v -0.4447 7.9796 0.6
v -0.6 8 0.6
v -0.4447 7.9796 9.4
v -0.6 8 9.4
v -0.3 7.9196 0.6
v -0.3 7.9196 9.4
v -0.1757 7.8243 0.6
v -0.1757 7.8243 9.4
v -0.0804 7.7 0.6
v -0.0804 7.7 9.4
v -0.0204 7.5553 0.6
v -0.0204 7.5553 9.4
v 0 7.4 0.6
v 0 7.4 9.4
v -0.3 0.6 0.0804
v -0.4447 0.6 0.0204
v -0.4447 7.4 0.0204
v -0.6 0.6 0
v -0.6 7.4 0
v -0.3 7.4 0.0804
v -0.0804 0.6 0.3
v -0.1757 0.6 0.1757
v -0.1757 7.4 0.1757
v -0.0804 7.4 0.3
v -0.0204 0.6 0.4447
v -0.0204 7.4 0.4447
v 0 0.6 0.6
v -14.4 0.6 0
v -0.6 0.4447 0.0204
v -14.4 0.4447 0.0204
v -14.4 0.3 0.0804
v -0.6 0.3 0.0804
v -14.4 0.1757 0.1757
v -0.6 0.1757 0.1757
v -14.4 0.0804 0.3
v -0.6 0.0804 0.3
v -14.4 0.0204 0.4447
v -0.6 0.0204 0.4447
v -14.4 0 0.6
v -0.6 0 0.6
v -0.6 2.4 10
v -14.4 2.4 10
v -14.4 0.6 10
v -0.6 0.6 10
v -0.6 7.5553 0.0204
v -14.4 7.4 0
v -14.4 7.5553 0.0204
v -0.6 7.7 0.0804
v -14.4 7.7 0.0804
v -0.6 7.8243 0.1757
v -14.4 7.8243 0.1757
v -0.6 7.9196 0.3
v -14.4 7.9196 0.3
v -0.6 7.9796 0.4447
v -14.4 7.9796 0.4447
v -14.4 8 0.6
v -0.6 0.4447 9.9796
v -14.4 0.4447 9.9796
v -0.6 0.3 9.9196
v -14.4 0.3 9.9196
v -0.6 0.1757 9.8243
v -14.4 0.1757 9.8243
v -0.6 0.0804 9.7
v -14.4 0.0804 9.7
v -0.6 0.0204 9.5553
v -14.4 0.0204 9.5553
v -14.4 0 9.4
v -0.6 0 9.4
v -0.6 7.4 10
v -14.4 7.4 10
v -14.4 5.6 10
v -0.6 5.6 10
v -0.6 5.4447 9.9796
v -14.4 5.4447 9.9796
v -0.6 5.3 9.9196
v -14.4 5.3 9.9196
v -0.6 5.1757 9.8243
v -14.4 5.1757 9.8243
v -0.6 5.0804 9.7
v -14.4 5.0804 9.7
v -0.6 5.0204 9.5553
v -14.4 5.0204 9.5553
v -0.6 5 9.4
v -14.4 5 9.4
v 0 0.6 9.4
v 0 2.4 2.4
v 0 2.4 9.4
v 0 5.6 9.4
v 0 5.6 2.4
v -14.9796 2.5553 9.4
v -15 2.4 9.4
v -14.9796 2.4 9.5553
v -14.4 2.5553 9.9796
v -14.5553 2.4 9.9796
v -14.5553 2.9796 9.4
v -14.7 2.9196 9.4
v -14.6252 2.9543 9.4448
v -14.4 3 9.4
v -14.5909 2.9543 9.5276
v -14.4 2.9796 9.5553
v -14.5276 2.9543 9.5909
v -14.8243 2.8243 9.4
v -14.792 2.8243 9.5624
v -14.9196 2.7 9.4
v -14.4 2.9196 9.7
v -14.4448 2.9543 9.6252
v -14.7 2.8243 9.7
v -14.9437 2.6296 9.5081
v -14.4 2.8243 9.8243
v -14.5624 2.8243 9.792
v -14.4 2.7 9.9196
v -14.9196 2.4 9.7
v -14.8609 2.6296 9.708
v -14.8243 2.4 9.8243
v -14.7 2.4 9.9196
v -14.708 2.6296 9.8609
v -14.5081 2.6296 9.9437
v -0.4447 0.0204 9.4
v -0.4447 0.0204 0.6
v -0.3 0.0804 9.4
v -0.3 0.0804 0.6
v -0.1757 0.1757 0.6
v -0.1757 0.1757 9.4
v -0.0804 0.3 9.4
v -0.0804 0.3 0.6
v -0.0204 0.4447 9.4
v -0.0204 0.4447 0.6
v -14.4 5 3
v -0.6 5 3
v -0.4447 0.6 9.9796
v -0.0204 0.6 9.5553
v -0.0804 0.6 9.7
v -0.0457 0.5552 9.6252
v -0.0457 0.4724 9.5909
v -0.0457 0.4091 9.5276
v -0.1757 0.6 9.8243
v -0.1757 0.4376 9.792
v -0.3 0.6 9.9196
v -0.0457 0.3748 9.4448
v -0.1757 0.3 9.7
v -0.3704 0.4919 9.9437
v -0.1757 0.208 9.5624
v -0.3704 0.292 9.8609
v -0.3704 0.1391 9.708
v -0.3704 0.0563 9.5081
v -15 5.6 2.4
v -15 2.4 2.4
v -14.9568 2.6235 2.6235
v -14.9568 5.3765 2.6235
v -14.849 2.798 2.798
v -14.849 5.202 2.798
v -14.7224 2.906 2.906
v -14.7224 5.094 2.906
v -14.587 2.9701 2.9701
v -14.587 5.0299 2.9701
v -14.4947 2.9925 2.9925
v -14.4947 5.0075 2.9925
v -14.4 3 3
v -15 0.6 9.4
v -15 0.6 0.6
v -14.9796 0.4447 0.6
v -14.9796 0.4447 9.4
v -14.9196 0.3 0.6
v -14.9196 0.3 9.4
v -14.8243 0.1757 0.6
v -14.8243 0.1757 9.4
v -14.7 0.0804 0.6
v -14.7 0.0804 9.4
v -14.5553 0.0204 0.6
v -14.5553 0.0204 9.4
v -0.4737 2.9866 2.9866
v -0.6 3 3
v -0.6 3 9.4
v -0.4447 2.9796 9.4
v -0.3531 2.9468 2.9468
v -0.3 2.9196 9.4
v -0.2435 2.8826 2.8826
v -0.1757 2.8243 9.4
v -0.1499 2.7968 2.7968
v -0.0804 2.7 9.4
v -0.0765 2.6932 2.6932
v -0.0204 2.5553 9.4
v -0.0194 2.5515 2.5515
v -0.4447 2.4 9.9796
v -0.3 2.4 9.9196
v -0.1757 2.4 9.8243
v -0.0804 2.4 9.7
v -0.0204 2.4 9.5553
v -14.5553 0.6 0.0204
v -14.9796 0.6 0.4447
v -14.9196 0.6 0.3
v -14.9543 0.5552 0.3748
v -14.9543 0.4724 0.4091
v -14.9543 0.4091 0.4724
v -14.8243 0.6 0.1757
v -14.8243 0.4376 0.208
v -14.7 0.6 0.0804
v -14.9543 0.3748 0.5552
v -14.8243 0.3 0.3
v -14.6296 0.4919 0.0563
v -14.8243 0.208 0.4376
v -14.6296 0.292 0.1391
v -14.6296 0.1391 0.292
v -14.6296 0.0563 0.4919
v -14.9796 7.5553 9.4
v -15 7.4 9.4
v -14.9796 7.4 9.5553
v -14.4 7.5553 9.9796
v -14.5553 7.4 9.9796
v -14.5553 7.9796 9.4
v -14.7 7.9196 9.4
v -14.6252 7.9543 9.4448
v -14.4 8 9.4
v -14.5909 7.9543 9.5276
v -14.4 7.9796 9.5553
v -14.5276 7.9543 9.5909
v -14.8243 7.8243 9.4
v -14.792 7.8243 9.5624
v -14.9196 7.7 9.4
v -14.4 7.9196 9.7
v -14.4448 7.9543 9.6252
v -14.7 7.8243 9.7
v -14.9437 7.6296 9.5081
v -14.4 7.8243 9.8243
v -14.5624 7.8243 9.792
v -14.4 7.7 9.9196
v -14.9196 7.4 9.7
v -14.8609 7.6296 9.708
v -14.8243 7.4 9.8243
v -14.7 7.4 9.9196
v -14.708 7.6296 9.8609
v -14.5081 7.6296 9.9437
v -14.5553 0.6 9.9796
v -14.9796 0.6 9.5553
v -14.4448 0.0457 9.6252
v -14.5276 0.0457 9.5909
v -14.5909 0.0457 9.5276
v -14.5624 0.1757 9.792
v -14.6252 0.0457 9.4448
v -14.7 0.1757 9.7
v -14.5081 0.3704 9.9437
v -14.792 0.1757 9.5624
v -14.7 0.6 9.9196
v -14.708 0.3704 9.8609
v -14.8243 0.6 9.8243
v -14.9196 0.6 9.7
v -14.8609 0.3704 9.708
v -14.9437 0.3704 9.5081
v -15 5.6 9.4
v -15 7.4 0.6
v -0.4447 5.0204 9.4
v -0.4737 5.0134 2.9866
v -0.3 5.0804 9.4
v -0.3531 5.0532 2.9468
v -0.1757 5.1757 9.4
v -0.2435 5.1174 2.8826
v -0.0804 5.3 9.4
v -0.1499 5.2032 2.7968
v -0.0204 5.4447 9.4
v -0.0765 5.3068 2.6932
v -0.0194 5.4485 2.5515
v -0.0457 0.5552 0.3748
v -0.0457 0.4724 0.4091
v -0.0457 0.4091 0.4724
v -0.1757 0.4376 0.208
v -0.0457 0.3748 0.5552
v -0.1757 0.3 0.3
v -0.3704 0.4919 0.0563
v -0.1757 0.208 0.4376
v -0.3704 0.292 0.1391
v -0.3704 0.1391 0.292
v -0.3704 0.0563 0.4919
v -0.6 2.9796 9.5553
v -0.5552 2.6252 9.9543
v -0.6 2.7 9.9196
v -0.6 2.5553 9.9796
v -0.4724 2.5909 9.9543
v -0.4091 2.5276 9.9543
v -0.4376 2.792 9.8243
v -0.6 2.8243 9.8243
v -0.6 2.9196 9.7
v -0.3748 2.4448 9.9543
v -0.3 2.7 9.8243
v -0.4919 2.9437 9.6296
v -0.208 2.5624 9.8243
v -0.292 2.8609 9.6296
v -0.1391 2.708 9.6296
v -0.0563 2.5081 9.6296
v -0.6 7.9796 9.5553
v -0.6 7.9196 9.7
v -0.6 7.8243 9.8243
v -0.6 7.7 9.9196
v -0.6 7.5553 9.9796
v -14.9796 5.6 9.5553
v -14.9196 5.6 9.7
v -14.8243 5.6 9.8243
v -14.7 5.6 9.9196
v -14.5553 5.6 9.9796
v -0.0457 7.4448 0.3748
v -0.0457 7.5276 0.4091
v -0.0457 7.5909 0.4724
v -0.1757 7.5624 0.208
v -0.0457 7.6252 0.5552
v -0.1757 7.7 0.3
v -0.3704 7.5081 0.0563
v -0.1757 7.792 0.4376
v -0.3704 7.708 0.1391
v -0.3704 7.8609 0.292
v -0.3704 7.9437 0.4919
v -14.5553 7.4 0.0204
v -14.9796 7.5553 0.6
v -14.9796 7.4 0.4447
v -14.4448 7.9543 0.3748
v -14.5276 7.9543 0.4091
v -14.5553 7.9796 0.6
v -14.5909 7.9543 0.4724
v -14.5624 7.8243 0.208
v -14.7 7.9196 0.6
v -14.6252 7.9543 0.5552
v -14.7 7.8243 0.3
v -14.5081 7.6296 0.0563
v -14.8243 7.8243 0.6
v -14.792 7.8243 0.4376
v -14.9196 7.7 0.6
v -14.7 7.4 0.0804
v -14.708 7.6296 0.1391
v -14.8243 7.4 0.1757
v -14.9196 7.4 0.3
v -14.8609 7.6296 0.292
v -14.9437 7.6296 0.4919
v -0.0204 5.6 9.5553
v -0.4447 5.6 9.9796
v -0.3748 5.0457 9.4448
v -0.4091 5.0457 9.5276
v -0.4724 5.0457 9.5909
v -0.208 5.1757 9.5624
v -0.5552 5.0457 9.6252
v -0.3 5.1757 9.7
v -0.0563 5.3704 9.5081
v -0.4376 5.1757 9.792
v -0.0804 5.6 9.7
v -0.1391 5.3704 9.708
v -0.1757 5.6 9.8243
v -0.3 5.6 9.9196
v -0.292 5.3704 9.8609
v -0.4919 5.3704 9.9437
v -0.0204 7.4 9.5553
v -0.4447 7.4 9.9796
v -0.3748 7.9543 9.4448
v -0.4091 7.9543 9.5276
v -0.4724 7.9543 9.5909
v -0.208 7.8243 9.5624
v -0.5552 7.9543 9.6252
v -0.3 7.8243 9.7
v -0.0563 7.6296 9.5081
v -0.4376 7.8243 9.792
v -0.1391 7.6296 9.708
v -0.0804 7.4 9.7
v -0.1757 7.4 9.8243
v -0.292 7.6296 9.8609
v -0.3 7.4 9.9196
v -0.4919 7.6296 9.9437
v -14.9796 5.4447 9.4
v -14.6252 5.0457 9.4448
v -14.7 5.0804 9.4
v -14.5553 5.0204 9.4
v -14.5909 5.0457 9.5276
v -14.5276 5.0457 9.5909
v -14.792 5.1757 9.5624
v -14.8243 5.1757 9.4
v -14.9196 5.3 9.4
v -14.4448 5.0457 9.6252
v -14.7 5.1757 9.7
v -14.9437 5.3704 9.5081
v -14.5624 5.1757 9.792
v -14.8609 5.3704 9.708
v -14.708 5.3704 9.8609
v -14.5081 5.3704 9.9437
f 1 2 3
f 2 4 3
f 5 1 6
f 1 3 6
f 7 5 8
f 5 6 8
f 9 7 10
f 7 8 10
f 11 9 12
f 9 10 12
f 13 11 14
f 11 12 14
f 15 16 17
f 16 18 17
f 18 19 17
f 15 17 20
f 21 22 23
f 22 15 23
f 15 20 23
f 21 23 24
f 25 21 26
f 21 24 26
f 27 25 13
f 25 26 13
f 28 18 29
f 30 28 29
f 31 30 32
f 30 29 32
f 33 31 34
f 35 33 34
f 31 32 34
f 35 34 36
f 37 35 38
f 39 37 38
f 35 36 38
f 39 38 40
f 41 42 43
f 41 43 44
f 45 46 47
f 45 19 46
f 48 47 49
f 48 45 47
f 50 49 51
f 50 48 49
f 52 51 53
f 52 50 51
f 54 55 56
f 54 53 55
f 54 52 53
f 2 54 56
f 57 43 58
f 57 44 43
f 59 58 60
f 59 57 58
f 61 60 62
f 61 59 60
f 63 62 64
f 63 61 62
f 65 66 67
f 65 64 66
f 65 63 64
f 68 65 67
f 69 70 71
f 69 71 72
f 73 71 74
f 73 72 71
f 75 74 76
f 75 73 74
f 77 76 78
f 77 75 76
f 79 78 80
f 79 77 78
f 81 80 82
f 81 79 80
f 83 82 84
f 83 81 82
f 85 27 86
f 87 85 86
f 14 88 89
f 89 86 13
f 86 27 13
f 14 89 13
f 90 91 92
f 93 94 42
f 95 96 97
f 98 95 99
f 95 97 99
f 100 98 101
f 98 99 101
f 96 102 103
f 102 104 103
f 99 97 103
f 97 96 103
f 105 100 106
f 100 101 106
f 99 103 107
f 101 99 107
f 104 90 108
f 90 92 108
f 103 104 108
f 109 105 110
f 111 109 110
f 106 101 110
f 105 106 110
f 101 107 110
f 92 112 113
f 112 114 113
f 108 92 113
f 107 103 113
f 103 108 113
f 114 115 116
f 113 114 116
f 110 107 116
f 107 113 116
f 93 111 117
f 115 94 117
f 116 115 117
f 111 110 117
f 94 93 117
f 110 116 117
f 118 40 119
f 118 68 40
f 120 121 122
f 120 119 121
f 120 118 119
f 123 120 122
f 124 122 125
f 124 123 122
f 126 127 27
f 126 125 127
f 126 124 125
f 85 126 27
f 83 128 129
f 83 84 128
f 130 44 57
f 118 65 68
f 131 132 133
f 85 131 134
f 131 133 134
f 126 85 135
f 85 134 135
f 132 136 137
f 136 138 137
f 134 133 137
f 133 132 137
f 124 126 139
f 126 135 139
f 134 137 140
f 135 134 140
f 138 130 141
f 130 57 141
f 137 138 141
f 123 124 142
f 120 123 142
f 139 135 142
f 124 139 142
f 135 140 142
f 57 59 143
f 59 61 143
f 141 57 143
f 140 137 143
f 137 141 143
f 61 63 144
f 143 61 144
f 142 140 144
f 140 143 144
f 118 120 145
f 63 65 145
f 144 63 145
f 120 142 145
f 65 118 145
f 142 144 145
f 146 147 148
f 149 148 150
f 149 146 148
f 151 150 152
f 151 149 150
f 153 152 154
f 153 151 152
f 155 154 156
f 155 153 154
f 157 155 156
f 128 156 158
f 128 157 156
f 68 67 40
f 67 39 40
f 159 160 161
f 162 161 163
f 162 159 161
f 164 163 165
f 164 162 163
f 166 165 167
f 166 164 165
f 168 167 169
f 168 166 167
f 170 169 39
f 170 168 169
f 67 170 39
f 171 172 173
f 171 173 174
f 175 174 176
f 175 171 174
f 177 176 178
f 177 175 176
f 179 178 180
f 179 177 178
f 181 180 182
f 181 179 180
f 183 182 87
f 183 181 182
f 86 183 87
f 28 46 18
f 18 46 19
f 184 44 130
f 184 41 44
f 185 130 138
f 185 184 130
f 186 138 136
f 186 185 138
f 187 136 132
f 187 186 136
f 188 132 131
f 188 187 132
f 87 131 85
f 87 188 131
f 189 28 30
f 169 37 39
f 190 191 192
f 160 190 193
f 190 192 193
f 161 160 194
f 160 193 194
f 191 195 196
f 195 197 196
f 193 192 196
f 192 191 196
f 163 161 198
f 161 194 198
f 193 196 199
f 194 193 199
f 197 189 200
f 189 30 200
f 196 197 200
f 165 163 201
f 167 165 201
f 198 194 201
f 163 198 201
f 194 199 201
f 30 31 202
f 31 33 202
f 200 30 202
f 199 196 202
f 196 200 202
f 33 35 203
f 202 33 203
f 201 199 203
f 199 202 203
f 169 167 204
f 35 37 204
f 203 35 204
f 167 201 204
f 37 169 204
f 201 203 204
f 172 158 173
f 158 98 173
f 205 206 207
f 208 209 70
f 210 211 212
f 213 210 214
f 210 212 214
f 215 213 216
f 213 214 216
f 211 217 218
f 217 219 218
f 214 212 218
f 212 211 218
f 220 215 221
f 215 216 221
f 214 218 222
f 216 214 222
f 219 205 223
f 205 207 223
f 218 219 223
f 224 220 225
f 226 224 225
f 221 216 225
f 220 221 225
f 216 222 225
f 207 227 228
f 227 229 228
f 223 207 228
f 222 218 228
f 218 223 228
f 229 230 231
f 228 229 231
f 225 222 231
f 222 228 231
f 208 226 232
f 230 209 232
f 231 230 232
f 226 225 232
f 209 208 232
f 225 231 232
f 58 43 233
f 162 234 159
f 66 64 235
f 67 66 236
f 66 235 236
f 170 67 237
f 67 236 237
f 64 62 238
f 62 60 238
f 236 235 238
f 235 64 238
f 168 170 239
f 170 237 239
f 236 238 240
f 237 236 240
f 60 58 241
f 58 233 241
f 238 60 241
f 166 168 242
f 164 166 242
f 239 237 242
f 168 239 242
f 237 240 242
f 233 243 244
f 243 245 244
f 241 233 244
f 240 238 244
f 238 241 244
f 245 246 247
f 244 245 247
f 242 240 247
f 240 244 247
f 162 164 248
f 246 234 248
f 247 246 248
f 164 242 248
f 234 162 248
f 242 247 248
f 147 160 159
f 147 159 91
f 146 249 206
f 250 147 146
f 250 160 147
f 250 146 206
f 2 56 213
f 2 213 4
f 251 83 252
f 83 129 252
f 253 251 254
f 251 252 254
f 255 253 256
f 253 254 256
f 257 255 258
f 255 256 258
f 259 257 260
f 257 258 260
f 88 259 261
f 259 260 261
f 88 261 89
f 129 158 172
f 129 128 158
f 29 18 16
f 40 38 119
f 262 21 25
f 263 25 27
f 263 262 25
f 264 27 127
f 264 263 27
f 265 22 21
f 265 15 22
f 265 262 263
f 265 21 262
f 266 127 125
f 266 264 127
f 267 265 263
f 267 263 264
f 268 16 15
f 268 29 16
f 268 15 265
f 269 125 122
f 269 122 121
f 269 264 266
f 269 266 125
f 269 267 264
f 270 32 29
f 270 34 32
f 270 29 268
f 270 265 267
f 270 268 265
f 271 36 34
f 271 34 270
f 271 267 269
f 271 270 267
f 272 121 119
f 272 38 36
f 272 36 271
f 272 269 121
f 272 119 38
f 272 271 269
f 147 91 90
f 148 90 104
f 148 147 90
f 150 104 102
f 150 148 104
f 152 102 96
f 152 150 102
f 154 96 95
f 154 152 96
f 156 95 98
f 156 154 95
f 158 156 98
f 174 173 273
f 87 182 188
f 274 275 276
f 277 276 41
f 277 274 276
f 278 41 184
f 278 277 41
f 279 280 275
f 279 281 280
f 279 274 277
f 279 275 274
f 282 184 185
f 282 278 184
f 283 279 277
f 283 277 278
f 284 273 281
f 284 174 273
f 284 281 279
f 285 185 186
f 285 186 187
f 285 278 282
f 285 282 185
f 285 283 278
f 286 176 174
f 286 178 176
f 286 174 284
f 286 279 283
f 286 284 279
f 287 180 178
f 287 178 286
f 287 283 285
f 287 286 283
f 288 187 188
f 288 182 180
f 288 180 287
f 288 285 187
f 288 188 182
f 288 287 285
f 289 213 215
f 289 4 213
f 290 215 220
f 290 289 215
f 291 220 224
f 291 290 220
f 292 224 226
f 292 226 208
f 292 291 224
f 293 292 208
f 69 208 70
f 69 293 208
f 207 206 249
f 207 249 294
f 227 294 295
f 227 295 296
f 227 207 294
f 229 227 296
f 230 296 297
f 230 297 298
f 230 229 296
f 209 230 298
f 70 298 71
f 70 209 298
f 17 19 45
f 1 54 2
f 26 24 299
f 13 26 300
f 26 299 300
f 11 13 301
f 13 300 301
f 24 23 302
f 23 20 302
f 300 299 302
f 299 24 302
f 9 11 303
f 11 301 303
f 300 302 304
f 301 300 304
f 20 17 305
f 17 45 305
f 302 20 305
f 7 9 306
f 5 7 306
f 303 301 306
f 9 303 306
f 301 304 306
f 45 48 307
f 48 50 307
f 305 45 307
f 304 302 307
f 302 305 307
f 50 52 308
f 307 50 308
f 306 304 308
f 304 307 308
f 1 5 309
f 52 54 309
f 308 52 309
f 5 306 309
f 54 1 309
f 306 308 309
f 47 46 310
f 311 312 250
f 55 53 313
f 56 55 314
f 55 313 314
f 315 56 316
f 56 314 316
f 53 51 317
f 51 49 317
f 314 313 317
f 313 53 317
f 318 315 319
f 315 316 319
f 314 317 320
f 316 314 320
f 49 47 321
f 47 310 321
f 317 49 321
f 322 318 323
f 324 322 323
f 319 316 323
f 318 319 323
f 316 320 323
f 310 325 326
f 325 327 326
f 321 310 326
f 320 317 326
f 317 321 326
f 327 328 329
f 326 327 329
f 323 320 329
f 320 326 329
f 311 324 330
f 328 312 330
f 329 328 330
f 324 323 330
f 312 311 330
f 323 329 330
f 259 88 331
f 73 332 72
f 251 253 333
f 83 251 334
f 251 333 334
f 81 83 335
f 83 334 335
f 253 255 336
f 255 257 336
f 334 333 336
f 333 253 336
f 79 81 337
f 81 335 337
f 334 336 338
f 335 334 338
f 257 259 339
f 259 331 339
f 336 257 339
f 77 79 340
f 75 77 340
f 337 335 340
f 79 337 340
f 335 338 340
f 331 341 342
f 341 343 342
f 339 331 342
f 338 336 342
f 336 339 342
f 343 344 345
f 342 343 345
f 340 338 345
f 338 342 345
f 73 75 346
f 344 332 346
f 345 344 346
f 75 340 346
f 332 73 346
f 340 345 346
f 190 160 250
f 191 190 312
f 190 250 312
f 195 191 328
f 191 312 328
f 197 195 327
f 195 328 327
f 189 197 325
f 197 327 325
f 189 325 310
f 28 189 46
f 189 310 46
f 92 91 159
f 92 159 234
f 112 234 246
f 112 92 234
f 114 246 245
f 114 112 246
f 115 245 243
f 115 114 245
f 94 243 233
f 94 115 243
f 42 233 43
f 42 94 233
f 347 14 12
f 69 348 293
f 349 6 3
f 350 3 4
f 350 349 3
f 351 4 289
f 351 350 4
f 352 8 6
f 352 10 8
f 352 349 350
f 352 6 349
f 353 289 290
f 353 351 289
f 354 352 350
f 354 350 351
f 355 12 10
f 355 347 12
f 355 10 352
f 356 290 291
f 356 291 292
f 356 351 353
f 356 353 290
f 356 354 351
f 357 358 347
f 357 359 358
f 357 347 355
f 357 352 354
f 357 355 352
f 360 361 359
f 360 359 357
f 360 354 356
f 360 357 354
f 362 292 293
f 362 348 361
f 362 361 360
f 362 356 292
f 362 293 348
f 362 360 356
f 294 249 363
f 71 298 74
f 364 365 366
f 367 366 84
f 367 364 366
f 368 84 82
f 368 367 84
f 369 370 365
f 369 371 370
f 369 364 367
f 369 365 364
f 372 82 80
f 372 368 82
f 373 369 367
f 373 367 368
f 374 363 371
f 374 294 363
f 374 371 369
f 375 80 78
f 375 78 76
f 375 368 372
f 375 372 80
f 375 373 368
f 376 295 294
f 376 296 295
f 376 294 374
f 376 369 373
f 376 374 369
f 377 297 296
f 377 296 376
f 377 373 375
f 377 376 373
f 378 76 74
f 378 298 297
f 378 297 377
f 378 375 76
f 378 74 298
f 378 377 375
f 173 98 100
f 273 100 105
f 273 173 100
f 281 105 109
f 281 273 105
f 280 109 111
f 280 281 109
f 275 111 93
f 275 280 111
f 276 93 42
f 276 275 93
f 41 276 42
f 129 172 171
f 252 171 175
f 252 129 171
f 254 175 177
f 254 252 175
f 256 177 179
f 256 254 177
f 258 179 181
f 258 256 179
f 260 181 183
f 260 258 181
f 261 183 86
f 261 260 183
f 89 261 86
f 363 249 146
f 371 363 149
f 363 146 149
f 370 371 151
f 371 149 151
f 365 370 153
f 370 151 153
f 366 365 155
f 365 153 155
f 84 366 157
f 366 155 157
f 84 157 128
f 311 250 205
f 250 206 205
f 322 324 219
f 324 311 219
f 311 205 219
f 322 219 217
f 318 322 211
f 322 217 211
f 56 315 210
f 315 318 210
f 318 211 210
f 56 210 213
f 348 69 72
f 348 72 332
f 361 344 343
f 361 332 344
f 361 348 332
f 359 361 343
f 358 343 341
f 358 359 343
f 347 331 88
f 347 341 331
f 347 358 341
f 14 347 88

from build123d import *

# Parameters (mm, degrees)
SKETCH1_W           = 15
SKETCH1_H           = 8
BOSS_EXTRUDE1_DEPTH = 10
SKETCH2_W           = 15
SKETCH2_H           = 2
CUT_EXTRUDE1_DEPTH  = 7
FILLET1_R           = 0.6


with BuildPart() as part:
    # Sketch1 → Boss-Extrude1 (new body)
    with BuildSketch(Plane.XY):
        with Locations((-7.5, 4)):
            Rectangle(SKETCH1_W, SKETCH1_H)
    extrude(amount=BOSS_EXTRUDE1_DEPTH)

    # Sketch2 → Cut-Extrude1 (cut)
    with BuildSketch(Plane.XY.offset(10)):
        with Locations((-7.5, 4)):
            Rectangle(SKETCH2_W, SKETCH2_H)
    extrude(amount=-CUT_EXTRUDE1_DEPTH, mode=Mode.SUBTRACT)

    # Fillet1
    fillet1_edges = [part.edges().sort_by_distance(p)[0] for p in [
        (-15, 6.5, 10),
        (0, 6.5, 10),
        (-15, 1.5, 10),
        (-7.5, 0, 10),
        (-15, 4, 3),
        (-15, 3, 6.5),
        (-15, 5, 6.5),
        (0, 4, 3),
        (0, 5, 6.5),
        (0, 3, 6.5),
        (-7.5, 3, 10),
        (-7.5, 5, 10),
        (0, 1.5, 10),
        (-7.5, 0, 0),
        (-15, 4, 0),
        (-7.5, 8, 0),
        (0, 4, 0),
        (0, 0, 5),
        (-15, 0, 5),
        (-15, 8, 5),
        (0, 8, 5),
        (-7.5, 8, 10),
    ]]
    fillet(fillet1_edges, radius=FILLET1_R)


solid = part.part
